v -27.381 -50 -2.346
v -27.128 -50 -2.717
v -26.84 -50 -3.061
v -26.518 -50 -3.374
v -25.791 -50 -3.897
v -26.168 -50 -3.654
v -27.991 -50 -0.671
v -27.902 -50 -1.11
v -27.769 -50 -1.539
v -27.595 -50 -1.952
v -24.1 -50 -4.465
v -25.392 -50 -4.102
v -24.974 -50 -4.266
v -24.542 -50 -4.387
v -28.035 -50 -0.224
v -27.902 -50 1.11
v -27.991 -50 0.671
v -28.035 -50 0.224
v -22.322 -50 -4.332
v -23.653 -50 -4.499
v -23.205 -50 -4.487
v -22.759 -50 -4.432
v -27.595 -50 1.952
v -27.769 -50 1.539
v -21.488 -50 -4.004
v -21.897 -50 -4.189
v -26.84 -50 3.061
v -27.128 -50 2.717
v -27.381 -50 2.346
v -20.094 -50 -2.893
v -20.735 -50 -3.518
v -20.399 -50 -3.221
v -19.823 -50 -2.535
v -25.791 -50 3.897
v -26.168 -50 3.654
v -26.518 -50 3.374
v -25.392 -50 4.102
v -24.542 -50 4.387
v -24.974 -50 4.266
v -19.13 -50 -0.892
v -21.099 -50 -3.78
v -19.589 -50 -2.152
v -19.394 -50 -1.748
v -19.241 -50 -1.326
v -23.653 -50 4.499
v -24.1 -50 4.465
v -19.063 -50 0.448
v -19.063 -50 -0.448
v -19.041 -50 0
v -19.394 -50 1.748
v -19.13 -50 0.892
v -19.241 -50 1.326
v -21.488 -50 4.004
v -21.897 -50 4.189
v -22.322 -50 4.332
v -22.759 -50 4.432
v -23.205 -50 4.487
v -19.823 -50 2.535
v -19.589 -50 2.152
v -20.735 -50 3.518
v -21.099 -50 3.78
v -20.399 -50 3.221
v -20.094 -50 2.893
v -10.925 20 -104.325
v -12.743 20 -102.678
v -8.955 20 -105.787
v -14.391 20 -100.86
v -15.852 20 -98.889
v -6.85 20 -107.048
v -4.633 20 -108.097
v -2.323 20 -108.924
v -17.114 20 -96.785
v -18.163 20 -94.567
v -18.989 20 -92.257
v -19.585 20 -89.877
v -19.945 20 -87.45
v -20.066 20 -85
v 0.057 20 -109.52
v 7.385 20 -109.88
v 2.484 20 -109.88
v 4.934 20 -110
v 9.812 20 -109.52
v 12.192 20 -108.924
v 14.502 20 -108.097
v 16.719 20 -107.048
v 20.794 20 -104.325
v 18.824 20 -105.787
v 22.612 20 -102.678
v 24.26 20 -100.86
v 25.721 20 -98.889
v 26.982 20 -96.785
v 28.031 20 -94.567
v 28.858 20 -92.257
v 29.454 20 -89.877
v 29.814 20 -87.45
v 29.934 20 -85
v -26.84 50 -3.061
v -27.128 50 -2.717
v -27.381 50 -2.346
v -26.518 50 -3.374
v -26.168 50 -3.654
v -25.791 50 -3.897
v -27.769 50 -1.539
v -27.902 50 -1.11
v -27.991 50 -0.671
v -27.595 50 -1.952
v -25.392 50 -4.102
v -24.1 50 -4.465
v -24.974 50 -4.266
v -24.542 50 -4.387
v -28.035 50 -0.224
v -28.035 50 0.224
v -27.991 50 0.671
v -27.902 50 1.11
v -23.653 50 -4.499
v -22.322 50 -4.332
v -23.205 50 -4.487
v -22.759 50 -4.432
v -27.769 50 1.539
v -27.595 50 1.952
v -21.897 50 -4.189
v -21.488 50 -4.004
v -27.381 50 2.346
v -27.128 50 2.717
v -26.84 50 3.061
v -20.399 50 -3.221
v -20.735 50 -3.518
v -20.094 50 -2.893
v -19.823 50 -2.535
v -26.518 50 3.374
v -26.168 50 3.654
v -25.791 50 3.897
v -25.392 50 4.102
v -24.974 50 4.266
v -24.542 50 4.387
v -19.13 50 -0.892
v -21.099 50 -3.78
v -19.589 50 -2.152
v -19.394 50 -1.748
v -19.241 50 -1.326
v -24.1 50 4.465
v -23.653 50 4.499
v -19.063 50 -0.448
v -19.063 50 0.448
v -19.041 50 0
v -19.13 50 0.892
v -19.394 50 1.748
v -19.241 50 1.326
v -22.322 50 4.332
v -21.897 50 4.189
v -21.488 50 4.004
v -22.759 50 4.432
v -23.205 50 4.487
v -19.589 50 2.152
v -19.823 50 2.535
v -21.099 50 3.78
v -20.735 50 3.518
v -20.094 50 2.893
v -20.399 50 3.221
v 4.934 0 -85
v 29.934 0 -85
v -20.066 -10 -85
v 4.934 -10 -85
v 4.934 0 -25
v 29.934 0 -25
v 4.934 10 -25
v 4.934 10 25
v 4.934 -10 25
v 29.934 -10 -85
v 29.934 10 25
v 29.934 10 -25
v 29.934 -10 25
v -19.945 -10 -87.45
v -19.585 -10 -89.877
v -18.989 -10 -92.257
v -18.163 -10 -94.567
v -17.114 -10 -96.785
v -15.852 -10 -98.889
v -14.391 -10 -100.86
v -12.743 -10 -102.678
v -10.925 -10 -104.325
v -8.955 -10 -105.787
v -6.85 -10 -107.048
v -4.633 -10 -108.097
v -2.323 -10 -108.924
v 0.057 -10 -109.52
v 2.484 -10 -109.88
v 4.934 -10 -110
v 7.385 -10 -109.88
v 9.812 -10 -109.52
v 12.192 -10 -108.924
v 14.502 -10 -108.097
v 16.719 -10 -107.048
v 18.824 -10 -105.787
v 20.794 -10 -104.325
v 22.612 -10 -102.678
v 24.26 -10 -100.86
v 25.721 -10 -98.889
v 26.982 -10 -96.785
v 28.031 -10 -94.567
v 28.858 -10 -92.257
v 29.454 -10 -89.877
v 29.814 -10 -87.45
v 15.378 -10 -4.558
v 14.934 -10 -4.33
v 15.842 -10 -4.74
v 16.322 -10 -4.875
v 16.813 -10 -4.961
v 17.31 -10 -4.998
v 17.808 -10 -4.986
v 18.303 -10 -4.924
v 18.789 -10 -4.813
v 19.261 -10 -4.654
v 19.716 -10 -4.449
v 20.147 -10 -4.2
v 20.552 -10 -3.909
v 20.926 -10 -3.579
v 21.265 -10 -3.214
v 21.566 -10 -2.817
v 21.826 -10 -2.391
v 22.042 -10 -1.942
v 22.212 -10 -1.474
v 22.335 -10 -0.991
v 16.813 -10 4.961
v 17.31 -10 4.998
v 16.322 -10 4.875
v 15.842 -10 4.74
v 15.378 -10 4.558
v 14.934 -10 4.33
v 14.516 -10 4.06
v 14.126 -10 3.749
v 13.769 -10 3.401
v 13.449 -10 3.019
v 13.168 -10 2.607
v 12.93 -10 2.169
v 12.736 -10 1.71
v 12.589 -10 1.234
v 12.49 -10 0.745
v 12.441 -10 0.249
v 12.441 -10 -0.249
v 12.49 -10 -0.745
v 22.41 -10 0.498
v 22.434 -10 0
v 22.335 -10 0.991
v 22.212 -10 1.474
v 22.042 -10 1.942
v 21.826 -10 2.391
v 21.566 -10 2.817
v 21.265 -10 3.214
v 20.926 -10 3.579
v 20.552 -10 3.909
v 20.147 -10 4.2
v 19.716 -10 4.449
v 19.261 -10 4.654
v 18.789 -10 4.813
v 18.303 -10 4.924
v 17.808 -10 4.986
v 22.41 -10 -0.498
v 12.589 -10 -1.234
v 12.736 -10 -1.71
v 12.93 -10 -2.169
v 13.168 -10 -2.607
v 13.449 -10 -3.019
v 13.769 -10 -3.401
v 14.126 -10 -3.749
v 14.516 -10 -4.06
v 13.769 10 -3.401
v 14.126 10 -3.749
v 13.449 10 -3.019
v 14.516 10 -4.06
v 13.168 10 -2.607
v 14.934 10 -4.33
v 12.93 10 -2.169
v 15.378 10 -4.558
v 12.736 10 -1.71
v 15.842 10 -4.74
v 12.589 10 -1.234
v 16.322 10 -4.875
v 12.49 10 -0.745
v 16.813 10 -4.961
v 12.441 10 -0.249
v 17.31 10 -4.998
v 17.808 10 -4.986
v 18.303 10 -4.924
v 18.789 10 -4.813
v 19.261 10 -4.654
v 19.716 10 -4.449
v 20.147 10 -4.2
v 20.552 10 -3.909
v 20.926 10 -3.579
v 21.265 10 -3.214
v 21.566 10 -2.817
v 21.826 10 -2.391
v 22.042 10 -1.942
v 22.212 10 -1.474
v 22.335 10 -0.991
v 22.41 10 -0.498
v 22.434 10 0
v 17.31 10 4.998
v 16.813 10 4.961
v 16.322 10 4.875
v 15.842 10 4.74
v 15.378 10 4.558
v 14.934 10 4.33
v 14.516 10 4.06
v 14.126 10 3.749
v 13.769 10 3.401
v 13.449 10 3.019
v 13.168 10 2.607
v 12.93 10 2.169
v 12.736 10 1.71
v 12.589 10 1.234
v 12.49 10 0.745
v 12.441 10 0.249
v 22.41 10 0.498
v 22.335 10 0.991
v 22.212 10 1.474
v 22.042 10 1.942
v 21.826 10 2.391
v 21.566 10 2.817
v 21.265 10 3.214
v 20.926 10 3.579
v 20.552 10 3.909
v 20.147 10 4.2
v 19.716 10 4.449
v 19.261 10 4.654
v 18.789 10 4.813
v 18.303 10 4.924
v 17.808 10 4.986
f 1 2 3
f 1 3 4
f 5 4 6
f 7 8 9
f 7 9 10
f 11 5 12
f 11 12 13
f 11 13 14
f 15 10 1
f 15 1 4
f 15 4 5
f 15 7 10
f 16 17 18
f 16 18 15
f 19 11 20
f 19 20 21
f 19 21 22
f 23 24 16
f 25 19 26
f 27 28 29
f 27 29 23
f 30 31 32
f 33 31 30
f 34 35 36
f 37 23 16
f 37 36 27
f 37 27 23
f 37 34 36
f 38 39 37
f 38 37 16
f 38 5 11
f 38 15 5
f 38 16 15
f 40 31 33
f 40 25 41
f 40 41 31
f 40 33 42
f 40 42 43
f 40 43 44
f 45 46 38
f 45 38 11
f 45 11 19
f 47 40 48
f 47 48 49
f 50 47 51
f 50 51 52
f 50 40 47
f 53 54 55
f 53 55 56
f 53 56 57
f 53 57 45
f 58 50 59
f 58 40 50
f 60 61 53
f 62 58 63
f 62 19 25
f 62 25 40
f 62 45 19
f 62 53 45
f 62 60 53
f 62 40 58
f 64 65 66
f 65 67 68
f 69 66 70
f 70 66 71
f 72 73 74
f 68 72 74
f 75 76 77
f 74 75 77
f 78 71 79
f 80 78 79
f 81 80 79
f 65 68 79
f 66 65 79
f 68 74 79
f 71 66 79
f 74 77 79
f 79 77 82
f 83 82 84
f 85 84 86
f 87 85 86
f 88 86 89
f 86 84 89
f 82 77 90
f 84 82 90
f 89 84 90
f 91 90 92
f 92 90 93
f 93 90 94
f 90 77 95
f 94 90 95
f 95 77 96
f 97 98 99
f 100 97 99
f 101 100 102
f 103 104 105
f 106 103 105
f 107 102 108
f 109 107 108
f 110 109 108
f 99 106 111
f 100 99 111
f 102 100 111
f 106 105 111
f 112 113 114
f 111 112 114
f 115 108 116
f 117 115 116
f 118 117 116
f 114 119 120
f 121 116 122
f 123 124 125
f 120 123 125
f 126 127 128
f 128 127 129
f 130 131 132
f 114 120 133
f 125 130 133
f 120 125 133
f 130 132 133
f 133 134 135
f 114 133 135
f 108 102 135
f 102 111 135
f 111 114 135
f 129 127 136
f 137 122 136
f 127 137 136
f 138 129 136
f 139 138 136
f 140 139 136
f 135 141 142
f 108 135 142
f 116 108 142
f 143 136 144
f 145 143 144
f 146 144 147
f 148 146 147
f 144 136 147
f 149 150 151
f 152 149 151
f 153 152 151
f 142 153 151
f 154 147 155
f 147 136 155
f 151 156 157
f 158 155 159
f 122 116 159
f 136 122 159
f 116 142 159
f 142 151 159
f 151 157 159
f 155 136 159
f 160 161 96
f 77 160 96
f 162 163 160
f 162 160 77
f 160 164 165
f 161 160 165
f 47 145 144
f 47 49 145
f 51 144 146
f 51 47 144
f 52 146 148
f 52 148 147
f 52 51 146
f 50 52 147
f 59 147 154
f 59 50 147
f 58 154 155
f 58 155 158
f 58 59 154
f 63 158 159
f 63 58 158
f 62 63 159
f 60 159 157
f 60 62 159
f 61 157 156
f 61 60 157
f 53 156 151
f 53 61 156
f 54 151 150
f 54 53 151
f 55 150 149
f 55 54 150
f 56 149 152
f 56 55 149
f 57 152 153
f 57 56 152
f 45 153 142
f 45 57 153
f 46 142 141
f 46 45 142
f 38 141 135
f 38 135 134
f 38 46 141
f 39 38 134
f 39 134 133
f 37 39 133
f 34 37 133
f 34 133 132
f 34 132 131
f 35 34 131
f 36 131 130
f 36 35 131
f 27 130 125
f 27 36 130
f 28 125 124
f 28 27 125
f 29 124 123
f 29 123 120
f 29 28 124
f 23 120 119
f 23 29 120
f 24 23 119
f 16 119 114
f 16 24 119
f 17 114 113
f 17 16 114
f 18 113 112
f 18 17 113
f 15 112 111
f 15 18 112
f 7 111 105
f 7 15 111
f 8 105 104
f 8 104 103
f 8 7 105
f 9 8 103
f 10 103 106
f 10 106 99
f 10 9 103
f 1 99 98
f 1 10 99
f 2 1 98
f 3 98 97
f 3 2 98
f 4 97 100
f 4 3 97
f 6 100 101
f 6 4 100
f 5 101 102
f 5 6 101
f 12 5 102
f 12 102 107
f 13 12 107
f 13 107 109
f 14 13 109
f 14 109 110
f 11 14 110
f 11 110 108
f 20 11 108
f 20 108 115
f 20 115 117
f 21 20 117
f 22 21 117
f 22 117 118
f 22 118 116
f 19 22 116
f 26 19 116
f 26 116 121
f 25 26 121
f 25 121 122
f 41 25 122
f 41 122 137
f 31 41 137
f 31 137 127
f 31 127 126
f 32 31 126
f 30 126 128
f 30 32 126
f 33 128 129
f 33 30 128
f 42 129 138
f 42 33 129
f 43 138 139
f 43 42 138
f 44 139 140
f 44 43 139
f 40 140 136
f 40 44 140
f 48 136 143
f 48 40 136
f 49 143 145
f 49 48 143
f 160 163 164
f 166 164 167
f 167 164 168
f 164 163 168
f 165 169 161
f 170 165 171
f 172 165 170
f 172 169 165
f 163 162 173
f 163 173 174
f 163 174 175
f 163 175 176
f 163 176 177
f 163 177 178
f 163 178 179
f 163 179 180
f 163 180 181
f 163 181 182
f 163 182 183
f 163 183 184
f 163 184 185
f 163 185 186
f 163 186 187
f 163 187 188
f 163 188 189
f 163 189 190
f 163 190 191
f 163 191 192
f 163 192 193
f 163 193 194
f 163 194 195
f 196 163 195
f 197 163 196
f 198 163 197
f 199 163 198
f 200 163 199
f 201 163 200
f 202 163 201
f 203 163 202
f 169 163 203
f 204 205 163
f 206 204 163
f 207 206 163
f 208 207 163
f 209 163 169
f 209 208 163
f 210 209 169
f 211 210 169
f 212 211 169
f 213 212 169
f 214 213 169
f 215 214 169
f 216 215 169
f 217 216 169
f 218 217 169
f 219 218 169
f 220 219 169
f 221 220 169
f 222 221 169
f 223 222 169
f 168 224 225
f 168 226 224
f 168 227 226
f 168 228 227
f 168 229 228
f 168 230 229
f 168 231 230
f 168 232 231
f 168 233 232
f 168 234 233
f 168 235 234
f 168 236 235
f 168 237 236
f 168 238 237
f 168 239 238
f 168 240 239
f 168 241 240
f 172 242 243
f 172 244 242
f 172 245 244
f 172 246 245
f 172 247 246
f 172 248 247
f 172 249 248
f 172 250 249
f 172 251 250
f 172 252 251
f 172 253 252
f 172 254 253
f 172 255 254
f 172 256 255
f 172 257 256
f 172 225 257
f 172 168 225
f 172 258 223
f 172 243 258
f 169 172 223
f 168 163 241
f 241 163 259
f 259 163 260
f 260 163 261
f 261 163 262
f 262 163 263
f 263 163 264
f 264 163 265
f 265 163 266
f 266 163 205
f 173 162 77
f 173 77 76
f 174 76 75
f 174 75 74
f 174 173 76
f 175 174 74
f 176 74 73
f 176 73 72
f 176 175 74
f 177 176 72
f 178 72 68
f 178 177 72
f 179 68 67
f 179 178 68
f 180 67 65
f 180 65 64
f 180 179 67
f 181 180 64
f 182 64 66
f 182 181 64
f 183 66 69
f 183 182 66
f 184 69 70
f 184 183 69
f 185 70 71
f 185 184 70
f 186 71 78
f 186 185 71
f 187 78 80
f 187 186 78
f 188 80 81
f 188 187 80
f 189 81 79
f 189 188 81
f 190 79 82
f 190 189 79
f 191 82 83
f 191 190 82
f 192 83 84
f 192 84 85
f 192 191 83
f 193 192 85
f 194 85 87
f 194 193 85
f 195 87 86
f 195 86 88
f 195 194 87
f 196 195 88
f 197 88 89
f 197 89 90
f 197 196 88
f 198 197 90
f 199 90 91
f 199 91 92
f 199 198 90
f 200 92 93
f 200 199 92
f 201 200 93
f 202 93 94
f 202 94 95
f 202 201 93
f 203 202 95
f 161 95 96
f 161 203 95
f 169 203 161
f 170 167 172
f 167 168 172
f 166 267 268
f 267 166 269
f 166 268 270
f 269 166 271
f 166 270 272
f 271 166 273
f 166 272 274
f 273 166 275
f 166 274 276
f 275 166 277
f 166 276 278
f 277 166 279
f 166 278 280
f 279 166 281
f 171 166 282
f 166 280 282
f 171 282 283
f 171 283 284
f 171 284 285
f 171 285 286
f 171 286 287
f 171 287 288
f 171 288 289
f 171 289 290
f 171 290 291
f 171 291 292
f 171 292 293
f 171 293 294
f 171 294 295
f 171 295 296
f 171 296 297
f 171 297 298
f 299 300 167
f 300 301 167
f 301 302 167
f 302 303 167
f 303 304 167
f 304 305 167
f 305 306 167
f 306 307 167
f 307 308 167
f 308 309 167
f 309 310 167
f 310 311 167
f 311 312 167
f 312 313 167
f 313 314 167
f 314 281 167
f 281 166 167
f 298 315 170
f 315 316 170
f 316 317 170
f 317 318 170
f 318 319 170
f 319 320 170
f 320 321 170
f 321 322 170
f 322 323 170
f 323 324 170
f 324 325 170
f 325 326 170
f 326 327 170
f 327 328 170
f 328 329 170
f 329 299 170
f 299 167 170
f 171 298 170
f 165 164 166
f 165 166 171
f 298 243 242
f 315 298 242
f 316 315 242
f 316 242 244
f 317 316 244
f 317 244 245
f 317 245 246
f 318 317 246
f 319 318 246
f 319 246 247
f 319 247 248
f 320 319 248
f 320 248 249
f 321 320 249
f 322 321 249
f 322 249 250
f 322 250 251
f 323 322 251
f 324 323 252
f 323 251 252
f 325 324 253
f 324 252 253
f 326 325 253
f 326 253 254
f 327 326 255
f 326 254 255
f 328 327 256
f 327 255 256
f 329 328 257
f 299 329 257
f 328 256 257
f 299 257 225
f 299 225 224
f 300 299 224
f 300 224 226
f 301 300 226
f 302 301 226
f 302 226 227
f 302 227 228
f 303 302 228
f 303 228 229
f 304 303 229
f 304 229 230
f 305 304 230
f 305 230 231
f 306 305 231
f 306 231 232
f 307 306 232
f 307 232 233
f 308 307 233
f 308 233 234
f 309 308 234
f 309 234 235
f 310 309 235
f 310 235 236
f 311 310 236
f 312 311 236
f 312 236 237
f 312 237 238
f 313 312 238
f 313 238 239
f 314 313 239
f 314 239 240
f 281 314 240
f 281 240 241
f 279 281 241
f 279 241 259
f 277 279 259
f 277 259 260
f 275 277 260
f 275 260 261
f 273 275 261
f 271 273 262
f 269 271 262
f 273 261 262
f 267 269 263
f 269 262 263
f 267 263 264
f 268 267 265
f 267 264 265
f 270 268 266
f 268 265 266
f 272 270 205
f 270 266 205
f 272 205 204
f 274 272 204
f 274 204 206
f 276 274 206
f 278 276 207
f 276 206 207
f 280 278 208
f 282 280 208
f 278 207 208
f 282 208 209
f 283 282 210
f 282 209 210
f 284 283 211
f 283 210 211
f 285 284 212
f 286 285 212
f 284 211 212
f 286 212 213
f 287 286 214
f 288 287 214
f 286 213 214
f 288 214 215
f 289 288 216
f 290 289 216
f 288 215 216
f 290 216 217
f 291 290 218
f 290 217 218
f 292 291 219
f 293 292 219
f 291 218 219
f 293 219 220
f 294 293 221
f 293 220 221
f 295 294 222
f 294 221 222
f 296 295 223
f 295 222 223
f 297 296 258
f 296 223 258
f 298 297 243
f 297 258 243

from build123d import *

# Parameters (mm, degrees)
F0_R     = 4.5
F1_DEPTH = 50
F2_W     = 25
F2_H     = 50
F3_DEPTH = 10
F4_W     = 25
F4_H     = 60
F5_DEPTH = 10
F7_DEPTH = 30
F8_R     = 5
F9_DEPTH = 60.001


with BuildPart() as f1:
    # F0 (on Front) → F1 (new body, symmetric)
    with BuildSketch(Plane.XZ):
        with Locations((-23.540846, 0)):
            Circle(F0_R)
    extrude(amount=F1_DEPTH, both=True)


with BuildPart() as f3:
    # F2 (on Front) → F3 (new body, symmetric)
    with BuildSketch(Plane.XZ):
        with Locations((17.434464, 0)):
            Rectangle(F2_W, F2_H)
    extrude(amount=F3_DEPTH, both=True)

    # F4 (on face) → F5 (join)
    with BuildSketch(Plane.XZ.offset(10)):
        with Locations((17.434464, -55)):
            Rectangle(F4_W, F4_H)
    extrude(amount=-F5_DEPTH)

    # F6 (on face) → F7 (join)
    with BuildSketch(Plane.XZ.offset(10)):
        with BuildLine():
            ThreePointArc((-20.065536, -85), (4.934464, -110), (29.934464, -85))
            Line((29.934464, -85), (4.934464, -85))
            Line((4.934464, -85), (-20.065536, -85))
        make_face()
    extrude(amount=-F7_DEPTH)

    # F8 (on face) → F9 (cut, through all)
    with BuildSketch(Plane.XZ.offset(10)):
        with Locations((17.434464, 0)):
            Circle(F8_R)
    extrude(amount=-F9_DEPTH, mode=Mode.SUBTRACT)


solid = Compound([f1.part, f3.part])
